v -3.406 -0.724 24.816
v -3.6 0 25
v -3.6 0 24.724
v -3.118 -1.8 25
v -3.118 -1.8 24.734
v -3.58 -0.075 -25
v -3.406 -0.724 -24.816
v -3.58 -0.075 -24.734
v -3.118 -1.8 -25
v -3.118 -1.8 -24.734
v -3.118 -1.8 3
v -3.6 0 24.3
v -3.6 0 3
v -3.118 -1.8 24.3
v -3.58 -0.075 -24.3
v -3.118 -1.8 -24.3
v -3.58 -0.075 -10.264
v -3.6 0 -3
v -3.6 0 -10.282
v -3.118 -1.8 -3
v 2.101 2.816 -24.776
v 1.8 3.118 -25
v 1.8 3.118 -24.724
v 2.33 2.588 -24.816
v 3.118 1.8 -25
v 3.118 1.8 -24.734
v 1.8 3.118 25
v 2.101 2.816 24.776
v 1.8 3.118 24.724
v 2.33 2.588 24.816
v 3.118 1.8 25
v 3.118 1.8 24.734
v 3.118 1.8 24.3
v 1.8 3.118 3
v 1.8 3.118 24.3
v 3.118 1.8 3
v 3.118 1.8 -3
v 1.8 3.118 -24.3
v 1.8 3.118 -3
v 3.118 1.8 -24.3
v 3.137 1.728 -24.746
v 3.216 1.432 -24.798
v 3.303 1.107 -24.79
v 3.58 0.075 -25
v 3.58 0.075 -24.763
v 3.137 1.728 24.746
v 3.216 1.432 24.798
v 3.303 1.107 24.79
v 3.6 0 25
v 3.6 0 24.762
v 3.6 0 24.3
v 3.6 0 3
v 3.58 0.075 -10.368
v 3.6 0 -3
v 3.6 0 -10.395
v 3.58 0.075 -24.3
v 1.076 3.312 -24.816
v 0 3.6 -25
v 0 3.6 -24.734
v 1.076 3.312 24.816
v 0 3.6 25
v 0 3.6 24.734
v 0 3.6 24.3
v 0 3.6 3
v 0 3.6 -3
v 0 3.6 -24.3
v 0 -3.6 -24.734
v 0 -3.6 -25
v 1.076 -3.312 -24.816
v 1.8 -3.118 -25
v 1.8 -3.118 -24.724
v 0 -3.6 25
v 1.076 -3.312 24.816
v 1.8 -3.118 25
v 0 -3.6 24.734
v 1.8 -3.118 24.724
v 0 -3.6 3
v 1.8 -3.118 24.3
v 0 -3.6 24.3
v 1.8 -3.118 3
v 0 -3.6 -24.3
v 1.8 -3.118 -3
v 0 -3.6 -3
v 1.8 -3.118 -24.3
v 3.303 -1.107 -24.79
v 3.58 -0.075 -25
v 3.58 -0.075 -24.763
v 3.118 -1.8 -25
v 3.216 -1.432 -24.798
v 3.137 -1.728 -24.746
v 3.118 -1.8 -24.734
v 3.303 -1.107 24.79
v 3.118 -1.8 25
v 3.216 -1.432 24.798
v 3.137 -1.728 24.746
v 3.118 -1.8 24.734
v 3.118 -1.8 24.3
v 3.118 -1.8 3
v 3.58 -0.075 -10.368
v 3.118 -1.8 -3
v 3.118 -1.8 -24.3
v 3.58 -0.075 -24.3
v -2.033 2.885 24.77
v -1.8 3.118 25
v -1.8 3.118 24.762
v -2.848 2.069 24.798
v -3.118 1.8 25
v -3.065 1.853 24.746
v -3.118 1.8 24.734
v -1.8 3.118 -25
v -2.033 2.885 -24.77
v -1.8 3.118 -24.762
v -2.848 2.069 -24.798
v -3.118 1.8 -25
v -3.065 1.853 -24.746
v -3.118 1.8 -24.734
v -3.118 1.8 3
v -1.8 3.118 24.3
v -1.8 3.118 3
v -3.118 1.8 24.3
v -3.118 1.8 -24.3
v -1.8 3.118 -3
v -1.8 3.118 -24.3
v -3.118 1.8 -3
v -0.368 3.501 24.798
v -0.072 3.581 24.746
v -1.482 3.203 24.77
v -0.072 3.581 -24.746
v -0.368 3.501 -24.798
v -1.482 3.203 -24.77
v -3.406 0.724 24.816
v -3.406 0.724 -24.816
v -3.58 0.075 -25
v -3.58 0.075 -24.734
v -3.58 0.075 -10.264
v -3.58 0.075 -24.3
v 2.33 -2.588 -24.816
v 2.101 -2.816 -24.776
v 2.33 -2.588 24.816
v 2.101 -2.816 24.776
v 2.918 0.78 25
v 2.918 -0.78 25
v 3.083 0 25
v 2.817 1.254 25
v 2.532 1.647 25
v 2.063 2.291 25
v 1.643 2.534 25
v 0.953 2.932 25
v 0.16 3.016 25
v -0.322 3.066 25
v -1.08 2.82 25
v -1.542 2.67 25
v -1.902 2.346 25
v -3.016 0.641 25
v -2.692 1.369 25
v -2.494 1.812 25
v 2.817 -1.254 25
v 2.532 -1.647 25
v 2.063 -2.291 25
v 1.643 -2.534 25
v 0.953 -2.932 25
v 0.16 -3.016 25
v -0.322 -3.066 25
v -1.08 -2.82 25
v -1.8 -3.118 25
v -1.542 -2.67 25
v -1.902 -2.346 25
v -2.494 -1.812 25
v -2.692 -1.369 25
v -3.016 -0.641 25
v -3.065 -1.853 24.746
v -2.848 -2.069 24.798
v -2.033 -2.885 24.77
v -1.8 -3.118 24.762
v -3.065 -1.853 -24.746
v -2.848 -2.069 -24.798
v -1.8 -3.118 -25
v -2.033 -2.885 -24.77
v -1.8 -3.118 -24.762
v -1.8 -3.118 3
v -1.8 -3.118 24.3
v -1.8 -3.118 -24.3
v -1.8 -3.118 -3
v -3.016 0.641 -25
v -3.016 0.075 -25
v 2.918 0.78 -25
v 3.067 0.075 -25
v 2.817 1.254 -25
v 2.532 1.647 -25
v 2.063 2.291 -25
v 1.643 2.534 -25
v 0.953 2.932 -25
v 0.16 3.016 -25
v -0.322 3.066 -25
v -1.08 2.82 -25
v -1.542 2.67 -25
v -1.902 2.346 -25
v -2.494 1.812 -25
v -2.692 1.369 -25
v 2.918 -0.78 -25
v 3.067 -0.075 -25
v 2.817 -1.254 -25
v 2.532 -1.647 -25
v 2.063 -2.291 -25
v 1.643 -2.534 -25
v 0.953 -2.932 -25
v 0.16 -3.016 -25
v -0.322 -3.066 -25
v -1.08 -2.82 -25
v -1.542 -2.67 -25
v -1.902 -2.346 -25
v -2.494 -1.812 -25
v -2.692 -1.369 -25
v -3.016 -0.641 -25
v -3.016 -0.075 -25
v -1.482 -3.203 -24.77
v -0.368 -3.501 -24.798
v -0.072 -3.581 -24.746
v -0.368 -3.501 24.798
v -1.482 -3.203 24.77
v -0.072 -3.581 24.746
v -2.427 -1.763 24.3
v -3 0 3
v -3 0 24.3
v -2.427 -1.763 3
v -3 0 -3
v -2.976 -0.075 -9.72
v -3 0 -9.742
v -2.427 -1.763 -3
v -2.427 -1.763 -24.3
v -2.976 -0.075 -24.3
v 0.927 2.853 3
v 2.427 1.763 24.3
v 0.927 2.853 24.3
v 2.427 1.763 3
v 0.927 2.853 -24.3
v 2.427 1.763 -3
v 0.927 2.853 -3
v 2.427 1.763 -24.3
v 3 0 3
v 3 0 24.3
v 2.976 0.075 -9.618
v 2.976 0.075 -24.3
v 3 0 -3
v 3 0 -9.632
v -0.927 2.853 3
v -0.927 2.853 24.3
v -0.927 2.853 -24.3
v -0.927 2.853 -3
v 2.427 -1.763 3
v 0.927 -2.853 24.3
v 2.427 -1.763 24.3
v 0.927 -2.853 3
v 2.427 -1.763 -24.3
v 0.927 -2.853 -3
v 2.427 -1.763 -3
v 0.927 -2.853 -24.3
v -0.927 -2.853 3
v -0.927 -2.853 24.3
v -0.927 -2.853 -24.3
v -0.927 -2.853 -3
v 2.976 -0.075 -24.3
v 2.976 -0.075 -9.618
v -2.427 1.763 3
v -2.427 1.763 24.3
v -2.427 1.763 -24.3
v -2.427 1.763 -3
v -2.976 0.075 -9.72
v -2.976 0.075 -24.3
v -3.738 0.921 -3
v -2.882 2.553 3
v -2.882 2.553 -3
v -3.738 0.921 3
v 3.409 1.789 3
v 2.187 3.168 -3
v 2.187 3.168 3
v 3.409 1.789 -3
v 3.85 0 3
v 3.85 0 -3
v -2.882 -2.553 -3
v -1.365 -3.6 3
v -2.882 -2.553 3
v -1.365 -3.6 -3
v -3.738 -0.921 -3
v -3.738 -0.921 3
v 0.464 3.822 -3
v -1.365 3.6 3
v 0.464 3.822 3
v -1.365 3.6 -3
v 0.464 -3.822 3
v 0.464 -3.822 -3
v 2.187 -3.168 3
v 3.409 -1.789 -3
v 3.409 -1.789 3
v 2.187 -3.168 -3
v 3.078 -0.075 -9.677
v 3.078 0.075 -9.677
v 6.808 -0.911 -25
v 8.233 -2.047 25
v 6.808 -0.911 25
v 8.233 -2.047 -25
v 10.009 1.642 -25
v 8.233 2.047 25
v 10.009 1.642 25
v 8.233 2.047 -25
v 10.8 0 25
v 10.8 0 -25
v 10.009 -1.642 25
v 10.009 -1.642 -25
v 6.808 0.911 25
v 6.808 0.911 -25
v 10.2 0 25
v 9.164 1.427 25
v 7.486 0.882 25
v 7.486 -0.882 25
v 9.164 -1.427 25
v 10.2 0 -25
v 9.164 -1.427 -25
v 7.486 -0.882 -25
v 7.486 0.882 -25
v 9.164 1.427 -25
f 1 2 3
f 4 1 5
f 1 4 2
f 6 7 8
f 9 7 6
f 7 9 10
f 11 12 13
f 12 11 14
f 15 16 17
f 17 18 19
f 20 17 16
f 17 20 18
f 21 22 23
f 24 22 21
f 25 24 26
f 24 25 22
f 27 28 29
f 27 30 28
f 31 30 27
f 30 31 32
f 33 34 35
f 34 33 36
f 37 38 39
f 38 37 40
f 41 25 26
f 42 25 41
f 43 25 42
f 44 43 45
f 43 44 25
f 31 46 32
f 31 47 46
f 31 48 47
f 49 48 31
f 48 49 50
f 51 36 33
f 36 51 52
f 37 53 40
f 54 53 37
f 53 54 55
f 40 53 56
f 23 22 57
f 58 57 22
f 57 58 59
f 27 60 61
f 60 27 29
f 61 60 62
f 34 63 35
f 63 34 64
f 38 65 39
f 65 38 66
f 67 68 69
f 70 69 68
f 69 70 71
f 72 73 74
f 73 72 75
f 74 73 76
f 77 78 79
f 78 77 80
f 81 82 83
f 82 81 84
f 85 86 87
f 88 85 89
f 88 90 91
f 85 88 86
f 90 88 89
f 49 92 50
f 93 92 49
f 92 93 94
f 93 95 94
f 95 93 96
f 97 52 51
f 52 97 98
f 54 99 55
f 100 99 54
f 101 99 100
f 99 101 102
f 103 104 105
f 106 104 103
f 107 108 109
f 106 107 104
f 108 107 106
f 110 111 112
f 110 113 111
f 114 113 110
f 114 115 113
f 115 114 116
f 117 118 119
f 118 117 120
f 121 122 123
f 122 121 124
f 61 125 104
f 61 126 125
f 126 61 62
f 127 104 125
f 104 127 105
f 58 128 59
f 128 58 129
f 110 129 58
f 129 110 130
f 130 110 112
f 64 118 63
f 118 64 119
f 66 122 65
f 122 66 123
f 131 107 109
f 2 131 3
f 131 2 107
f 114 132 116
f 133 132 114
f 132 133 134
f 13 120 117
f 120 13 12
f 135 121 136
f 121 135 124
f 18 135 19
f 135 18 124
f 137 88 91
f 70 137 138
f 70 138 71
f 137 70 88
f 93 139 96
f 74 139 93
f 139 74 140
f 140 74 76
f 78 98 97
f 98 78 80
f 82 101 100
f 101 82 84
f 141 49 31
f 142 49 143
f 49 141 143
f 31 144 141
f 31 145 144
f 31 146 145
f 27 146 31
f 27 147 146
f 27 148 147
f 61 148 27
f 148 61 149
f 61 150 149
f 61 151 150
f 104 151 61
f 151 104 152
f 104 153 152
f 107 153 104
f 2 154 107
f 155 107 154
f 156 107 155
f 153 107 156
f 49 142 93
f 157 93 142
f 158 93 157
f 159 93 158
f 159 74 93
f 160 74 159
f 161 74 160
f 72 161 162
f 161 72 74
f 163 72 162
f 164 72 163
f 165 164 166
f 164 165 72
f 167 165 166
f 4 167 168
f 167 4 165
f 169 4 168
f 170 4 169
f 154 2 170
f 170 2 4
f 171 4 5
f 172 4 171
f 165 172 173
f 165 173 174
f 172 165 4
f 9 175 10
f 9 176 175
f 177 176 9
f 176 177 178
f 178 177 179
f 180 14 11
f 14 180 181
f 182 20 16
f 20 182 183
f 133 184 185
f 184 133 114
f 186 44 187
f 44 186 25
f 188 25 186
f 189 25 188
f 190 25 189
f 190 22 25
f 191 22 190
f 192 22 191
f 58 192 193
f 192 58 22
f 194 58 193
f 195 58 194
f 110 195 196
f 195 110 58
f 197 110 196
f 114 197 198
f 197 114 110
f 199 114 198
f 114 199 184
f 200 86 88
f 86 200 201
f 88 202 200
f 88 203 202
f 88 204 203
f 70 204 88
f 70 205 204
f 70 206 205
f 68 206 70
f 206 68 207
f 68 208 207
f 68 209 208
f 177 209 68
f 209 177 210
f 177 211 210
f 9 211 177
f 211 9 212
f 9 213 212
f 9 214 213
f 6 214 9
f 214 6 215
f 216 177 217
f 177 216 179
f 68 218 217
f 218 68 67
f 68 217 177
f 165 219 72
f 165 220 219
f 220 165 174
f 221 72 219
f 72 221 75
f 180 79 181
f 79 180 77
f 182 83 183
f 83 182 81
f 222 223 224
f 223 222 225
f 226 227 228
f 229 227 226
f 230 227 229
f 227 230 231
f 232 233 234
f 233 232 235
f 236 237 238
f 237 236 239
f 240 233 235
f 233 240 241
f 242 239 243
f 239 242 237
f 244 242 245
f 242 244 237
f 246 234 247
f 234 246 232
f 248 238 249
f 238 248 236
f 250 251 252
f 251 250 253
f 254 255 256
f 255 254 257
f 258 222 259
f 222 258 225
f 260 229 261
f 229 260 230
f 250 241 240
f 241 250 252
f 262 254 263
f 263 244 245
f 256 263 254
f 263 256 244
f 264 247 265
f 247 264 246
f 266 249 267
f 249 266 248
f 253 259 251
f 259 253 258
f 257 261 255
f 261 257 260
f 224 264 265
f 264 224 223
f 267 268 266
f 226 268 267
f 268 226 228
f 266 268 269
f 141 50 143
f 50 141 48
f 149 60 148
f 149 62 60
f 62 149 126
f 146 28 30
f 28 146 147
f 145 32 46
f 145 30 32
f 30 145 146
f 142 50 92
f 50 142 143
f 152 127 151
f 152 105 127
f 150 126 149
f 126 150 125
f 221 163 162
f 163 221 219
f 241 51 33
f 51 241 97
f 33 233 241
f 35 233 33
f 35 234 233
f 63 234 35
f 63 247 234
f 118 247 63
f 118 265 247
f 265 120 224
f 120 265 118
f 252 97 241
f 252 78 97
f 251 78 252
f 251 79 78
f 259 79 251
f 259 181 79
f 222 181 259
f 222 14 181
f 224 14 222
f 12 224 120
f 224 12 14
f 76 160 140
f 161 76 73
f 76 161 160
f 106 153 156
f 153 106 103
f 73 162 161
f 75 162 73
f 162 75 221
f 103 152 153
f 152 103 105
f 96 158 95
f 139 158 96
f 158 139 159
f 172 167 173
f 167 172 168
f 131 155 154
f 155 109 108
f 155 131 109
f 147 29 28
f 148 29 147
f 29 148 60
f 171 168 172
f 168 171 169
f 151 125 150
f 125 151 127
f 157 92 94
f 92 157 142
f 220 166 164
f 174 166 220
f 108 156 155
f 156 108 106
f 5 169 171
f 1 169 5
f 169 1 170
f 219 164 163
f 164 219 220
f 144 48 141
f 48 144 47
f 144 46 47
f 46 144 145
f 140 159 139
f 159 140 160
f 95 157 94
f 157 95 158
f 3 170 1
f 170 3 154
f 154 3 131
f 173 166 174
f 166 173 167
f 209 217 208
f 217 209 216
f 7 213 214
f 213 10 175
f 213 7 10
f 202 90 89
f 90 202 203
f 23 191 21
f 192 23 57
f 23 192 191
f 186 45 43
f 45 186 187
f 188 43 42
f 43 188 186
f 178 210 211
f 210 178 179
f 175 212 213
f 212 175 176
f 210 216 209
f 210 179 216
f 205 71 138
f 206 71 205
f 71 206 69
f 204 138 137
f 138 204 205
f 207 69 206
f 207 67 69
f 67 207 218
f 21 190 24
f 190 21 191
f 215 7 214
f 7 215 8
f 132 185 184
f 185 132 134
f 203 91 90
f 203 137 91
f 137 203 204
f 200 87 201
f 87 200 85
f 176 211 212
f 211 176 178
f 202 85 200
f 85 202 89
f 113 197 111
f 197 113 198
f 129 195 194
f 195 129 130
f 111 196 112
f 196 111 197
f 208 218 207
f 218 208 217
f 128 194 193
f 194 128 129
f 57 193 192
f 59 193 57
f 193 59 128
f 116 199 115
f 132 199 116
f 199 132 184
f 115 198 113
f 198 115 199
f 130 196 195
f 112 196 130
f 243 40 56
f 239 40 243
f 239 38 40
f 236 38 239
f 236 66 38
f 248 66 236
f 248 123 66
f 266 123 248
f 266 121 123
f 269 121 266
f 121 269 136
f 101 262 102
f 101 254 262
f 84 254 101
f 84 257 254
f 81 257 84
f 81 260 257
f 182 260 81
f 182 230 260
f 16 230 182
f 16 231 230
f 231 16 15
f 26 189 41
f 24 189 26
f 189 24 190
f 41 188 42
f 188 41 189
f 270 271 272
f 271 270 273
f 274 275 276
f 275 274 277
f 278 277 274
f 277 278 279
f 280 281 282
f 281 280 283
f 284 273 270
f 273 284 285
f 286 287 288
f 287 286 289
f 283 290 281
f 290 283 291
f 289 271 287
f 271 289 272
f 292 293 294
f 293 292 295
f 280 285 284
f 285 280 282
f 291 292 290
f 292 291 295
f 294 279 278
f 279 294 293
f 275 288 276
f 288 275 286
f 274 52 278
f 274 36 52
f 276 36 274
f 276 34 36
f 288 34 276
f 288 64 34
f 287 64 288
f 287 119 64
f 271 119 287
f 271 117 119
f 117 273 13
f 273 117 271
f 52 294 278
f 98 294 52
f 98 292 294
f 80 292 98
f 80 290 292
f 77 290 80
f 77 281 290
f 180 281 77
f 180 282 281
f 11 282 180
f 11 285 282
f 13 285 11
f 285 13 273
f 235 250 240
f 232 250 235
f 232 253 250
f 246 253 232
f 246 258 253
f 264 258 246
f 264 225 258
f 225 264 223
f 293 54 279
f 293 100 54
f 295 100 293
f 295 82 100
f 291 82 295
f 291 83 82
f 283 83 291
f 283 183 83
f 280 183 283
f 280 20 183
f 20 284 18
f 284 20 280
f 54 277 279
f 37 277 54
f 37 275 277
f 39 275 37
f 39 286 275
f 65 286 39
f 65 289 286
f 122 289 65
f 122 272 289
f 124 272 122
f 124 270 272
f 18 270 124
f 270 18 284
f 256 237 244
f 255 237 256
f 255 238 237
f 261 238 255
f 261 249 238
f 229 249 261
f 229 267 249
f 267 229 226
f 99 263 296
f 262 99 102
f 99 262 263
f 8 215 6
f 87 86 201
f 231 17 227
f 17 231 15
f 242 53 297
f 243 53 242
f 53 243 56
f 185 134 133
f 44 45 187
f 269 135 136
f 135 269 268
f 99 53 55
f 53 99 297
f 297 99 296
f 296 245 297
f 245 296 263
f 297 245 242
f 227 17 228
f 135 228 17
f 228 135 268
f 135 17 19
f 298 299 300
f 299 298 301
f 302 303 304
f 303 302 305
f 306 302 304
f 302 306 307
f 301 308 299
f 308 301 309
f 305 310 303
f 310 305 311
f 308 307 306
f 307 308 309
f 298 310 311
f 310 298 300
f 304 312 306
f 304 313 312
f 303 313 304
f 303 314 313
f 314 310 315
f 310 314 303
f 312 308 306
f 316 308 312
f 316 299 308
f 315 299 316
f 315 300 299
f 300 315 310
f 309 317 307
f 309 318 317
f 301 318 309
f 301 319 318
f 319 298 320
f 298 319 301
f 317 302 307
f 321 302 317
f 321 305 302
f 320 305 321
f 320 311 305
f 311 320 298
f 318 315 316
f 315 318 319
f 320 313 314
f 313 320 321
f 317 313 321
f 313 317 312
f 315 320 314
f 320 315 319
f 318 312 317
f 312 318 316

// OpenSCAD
// Parameters
L = 50; //[25:100:1]
ID = 6; //[3:12:0.1]
wall = 0.6; //[0.3:1.2:0.05]
OD = 7.2; //[3.6:14.4:0.1]
shrink_ratio = 2; //[1.2:4:0.1]
ID_recovered = 3; //[1.5:6:0.1]
overlap = 1; //[0.5:2:0.1]
chamfer_L = 1.2; //[0.6:2.4:0.1]
mark_band_w = 6; //[3:12:0.5]
mark_band_t = 0.25; //[0.1:0.6:0.05]
texture_depth = 0.15; //[0.05:0.4:0.05]
texture_pitch = 2.5; //[1.5:6:0.1]

// Base Shapes
module sleeve_body_outer() {
  cylinder(r=OD/2, h=L, center=true);
}

module inner_bore() {
  cylinder(r=ID/2, h=L + 2*overlap, center=true);
}

module end_chamfer_top_cut() {
  translate([0, 0, L/2 - chamfer_L/2 + overlap/2])
    cylinder(r1=OD/2 + overlap, r2=ID/2 - overlap, h=chamfer_L, center=true);
}

module end_chamfer_bottom_cut() {
  translate([0, 0, -L/2 + chamfer_L/2 - overlap/2])
    cylinder(r1=ID/2 - overlap, r2=OD/2 + overlap, h=chamfer_L, center=true);
}

module printed_marking_band() {
  cylinder(r=OD/2 + mark_band_t, h=mark_band_w, center=true);
}

module texture_groove_cutter() {
  rotate([90, 0, 0])
    cylinder(r=OD/2 + overlap, h=texture_depth, center=true);
}

module post_shrink_outer() {
  translate([OD/2 + ((ID_recovered/2) + wall) + 3*overlap, 0, 0])
    cylinder(r=(ID_recovered/2) + wall, h=L, center=true);
}

module post_shrink_inner_bore() {
  translate([OD/2 + ((ID_recovered/2) + wall) + 3*overlap, 0, 0])
    cylinder(r=ID_recovered/2, h=L + 2*overlap, center=true);
}

// Operations
module sleeve_hollow() {
  difference() {
    sleeve_body_outer();
    inner_bore();
  }
}

module sleeve_with_end_chamfers() {
  difference() {
    sleeve_hollow();
    end_chamfer_top_cut();
    end_chamfer_bottom_cut();
  }
}

module sleeve_with_marking_band() {
  union() {
    sleeve_with_end_chamfers();
    printed_marking_band();
  }
}

module surface_texture() {
  difference() {
    sleeve_with_marking_band();
    for (i = [1:5]) {
      translate([0, 0, -L/2 + (i*L/(floor(L/texture_pitch)+1))])
        texture_groove_cutter();
    }
  }
}

module post_shrink_variant() {
  difference() {
    post_shrink_outer();
    post_shrink_inner_bore();
  }
}

// Final Model
module complete_model() {
  union() {
    surface_texture();
    post_shrink_variant();
  }
}

// Render the complete model
color([0.85, 0.85, 0.8]) // Off-white for heatshrink
complete_model();
